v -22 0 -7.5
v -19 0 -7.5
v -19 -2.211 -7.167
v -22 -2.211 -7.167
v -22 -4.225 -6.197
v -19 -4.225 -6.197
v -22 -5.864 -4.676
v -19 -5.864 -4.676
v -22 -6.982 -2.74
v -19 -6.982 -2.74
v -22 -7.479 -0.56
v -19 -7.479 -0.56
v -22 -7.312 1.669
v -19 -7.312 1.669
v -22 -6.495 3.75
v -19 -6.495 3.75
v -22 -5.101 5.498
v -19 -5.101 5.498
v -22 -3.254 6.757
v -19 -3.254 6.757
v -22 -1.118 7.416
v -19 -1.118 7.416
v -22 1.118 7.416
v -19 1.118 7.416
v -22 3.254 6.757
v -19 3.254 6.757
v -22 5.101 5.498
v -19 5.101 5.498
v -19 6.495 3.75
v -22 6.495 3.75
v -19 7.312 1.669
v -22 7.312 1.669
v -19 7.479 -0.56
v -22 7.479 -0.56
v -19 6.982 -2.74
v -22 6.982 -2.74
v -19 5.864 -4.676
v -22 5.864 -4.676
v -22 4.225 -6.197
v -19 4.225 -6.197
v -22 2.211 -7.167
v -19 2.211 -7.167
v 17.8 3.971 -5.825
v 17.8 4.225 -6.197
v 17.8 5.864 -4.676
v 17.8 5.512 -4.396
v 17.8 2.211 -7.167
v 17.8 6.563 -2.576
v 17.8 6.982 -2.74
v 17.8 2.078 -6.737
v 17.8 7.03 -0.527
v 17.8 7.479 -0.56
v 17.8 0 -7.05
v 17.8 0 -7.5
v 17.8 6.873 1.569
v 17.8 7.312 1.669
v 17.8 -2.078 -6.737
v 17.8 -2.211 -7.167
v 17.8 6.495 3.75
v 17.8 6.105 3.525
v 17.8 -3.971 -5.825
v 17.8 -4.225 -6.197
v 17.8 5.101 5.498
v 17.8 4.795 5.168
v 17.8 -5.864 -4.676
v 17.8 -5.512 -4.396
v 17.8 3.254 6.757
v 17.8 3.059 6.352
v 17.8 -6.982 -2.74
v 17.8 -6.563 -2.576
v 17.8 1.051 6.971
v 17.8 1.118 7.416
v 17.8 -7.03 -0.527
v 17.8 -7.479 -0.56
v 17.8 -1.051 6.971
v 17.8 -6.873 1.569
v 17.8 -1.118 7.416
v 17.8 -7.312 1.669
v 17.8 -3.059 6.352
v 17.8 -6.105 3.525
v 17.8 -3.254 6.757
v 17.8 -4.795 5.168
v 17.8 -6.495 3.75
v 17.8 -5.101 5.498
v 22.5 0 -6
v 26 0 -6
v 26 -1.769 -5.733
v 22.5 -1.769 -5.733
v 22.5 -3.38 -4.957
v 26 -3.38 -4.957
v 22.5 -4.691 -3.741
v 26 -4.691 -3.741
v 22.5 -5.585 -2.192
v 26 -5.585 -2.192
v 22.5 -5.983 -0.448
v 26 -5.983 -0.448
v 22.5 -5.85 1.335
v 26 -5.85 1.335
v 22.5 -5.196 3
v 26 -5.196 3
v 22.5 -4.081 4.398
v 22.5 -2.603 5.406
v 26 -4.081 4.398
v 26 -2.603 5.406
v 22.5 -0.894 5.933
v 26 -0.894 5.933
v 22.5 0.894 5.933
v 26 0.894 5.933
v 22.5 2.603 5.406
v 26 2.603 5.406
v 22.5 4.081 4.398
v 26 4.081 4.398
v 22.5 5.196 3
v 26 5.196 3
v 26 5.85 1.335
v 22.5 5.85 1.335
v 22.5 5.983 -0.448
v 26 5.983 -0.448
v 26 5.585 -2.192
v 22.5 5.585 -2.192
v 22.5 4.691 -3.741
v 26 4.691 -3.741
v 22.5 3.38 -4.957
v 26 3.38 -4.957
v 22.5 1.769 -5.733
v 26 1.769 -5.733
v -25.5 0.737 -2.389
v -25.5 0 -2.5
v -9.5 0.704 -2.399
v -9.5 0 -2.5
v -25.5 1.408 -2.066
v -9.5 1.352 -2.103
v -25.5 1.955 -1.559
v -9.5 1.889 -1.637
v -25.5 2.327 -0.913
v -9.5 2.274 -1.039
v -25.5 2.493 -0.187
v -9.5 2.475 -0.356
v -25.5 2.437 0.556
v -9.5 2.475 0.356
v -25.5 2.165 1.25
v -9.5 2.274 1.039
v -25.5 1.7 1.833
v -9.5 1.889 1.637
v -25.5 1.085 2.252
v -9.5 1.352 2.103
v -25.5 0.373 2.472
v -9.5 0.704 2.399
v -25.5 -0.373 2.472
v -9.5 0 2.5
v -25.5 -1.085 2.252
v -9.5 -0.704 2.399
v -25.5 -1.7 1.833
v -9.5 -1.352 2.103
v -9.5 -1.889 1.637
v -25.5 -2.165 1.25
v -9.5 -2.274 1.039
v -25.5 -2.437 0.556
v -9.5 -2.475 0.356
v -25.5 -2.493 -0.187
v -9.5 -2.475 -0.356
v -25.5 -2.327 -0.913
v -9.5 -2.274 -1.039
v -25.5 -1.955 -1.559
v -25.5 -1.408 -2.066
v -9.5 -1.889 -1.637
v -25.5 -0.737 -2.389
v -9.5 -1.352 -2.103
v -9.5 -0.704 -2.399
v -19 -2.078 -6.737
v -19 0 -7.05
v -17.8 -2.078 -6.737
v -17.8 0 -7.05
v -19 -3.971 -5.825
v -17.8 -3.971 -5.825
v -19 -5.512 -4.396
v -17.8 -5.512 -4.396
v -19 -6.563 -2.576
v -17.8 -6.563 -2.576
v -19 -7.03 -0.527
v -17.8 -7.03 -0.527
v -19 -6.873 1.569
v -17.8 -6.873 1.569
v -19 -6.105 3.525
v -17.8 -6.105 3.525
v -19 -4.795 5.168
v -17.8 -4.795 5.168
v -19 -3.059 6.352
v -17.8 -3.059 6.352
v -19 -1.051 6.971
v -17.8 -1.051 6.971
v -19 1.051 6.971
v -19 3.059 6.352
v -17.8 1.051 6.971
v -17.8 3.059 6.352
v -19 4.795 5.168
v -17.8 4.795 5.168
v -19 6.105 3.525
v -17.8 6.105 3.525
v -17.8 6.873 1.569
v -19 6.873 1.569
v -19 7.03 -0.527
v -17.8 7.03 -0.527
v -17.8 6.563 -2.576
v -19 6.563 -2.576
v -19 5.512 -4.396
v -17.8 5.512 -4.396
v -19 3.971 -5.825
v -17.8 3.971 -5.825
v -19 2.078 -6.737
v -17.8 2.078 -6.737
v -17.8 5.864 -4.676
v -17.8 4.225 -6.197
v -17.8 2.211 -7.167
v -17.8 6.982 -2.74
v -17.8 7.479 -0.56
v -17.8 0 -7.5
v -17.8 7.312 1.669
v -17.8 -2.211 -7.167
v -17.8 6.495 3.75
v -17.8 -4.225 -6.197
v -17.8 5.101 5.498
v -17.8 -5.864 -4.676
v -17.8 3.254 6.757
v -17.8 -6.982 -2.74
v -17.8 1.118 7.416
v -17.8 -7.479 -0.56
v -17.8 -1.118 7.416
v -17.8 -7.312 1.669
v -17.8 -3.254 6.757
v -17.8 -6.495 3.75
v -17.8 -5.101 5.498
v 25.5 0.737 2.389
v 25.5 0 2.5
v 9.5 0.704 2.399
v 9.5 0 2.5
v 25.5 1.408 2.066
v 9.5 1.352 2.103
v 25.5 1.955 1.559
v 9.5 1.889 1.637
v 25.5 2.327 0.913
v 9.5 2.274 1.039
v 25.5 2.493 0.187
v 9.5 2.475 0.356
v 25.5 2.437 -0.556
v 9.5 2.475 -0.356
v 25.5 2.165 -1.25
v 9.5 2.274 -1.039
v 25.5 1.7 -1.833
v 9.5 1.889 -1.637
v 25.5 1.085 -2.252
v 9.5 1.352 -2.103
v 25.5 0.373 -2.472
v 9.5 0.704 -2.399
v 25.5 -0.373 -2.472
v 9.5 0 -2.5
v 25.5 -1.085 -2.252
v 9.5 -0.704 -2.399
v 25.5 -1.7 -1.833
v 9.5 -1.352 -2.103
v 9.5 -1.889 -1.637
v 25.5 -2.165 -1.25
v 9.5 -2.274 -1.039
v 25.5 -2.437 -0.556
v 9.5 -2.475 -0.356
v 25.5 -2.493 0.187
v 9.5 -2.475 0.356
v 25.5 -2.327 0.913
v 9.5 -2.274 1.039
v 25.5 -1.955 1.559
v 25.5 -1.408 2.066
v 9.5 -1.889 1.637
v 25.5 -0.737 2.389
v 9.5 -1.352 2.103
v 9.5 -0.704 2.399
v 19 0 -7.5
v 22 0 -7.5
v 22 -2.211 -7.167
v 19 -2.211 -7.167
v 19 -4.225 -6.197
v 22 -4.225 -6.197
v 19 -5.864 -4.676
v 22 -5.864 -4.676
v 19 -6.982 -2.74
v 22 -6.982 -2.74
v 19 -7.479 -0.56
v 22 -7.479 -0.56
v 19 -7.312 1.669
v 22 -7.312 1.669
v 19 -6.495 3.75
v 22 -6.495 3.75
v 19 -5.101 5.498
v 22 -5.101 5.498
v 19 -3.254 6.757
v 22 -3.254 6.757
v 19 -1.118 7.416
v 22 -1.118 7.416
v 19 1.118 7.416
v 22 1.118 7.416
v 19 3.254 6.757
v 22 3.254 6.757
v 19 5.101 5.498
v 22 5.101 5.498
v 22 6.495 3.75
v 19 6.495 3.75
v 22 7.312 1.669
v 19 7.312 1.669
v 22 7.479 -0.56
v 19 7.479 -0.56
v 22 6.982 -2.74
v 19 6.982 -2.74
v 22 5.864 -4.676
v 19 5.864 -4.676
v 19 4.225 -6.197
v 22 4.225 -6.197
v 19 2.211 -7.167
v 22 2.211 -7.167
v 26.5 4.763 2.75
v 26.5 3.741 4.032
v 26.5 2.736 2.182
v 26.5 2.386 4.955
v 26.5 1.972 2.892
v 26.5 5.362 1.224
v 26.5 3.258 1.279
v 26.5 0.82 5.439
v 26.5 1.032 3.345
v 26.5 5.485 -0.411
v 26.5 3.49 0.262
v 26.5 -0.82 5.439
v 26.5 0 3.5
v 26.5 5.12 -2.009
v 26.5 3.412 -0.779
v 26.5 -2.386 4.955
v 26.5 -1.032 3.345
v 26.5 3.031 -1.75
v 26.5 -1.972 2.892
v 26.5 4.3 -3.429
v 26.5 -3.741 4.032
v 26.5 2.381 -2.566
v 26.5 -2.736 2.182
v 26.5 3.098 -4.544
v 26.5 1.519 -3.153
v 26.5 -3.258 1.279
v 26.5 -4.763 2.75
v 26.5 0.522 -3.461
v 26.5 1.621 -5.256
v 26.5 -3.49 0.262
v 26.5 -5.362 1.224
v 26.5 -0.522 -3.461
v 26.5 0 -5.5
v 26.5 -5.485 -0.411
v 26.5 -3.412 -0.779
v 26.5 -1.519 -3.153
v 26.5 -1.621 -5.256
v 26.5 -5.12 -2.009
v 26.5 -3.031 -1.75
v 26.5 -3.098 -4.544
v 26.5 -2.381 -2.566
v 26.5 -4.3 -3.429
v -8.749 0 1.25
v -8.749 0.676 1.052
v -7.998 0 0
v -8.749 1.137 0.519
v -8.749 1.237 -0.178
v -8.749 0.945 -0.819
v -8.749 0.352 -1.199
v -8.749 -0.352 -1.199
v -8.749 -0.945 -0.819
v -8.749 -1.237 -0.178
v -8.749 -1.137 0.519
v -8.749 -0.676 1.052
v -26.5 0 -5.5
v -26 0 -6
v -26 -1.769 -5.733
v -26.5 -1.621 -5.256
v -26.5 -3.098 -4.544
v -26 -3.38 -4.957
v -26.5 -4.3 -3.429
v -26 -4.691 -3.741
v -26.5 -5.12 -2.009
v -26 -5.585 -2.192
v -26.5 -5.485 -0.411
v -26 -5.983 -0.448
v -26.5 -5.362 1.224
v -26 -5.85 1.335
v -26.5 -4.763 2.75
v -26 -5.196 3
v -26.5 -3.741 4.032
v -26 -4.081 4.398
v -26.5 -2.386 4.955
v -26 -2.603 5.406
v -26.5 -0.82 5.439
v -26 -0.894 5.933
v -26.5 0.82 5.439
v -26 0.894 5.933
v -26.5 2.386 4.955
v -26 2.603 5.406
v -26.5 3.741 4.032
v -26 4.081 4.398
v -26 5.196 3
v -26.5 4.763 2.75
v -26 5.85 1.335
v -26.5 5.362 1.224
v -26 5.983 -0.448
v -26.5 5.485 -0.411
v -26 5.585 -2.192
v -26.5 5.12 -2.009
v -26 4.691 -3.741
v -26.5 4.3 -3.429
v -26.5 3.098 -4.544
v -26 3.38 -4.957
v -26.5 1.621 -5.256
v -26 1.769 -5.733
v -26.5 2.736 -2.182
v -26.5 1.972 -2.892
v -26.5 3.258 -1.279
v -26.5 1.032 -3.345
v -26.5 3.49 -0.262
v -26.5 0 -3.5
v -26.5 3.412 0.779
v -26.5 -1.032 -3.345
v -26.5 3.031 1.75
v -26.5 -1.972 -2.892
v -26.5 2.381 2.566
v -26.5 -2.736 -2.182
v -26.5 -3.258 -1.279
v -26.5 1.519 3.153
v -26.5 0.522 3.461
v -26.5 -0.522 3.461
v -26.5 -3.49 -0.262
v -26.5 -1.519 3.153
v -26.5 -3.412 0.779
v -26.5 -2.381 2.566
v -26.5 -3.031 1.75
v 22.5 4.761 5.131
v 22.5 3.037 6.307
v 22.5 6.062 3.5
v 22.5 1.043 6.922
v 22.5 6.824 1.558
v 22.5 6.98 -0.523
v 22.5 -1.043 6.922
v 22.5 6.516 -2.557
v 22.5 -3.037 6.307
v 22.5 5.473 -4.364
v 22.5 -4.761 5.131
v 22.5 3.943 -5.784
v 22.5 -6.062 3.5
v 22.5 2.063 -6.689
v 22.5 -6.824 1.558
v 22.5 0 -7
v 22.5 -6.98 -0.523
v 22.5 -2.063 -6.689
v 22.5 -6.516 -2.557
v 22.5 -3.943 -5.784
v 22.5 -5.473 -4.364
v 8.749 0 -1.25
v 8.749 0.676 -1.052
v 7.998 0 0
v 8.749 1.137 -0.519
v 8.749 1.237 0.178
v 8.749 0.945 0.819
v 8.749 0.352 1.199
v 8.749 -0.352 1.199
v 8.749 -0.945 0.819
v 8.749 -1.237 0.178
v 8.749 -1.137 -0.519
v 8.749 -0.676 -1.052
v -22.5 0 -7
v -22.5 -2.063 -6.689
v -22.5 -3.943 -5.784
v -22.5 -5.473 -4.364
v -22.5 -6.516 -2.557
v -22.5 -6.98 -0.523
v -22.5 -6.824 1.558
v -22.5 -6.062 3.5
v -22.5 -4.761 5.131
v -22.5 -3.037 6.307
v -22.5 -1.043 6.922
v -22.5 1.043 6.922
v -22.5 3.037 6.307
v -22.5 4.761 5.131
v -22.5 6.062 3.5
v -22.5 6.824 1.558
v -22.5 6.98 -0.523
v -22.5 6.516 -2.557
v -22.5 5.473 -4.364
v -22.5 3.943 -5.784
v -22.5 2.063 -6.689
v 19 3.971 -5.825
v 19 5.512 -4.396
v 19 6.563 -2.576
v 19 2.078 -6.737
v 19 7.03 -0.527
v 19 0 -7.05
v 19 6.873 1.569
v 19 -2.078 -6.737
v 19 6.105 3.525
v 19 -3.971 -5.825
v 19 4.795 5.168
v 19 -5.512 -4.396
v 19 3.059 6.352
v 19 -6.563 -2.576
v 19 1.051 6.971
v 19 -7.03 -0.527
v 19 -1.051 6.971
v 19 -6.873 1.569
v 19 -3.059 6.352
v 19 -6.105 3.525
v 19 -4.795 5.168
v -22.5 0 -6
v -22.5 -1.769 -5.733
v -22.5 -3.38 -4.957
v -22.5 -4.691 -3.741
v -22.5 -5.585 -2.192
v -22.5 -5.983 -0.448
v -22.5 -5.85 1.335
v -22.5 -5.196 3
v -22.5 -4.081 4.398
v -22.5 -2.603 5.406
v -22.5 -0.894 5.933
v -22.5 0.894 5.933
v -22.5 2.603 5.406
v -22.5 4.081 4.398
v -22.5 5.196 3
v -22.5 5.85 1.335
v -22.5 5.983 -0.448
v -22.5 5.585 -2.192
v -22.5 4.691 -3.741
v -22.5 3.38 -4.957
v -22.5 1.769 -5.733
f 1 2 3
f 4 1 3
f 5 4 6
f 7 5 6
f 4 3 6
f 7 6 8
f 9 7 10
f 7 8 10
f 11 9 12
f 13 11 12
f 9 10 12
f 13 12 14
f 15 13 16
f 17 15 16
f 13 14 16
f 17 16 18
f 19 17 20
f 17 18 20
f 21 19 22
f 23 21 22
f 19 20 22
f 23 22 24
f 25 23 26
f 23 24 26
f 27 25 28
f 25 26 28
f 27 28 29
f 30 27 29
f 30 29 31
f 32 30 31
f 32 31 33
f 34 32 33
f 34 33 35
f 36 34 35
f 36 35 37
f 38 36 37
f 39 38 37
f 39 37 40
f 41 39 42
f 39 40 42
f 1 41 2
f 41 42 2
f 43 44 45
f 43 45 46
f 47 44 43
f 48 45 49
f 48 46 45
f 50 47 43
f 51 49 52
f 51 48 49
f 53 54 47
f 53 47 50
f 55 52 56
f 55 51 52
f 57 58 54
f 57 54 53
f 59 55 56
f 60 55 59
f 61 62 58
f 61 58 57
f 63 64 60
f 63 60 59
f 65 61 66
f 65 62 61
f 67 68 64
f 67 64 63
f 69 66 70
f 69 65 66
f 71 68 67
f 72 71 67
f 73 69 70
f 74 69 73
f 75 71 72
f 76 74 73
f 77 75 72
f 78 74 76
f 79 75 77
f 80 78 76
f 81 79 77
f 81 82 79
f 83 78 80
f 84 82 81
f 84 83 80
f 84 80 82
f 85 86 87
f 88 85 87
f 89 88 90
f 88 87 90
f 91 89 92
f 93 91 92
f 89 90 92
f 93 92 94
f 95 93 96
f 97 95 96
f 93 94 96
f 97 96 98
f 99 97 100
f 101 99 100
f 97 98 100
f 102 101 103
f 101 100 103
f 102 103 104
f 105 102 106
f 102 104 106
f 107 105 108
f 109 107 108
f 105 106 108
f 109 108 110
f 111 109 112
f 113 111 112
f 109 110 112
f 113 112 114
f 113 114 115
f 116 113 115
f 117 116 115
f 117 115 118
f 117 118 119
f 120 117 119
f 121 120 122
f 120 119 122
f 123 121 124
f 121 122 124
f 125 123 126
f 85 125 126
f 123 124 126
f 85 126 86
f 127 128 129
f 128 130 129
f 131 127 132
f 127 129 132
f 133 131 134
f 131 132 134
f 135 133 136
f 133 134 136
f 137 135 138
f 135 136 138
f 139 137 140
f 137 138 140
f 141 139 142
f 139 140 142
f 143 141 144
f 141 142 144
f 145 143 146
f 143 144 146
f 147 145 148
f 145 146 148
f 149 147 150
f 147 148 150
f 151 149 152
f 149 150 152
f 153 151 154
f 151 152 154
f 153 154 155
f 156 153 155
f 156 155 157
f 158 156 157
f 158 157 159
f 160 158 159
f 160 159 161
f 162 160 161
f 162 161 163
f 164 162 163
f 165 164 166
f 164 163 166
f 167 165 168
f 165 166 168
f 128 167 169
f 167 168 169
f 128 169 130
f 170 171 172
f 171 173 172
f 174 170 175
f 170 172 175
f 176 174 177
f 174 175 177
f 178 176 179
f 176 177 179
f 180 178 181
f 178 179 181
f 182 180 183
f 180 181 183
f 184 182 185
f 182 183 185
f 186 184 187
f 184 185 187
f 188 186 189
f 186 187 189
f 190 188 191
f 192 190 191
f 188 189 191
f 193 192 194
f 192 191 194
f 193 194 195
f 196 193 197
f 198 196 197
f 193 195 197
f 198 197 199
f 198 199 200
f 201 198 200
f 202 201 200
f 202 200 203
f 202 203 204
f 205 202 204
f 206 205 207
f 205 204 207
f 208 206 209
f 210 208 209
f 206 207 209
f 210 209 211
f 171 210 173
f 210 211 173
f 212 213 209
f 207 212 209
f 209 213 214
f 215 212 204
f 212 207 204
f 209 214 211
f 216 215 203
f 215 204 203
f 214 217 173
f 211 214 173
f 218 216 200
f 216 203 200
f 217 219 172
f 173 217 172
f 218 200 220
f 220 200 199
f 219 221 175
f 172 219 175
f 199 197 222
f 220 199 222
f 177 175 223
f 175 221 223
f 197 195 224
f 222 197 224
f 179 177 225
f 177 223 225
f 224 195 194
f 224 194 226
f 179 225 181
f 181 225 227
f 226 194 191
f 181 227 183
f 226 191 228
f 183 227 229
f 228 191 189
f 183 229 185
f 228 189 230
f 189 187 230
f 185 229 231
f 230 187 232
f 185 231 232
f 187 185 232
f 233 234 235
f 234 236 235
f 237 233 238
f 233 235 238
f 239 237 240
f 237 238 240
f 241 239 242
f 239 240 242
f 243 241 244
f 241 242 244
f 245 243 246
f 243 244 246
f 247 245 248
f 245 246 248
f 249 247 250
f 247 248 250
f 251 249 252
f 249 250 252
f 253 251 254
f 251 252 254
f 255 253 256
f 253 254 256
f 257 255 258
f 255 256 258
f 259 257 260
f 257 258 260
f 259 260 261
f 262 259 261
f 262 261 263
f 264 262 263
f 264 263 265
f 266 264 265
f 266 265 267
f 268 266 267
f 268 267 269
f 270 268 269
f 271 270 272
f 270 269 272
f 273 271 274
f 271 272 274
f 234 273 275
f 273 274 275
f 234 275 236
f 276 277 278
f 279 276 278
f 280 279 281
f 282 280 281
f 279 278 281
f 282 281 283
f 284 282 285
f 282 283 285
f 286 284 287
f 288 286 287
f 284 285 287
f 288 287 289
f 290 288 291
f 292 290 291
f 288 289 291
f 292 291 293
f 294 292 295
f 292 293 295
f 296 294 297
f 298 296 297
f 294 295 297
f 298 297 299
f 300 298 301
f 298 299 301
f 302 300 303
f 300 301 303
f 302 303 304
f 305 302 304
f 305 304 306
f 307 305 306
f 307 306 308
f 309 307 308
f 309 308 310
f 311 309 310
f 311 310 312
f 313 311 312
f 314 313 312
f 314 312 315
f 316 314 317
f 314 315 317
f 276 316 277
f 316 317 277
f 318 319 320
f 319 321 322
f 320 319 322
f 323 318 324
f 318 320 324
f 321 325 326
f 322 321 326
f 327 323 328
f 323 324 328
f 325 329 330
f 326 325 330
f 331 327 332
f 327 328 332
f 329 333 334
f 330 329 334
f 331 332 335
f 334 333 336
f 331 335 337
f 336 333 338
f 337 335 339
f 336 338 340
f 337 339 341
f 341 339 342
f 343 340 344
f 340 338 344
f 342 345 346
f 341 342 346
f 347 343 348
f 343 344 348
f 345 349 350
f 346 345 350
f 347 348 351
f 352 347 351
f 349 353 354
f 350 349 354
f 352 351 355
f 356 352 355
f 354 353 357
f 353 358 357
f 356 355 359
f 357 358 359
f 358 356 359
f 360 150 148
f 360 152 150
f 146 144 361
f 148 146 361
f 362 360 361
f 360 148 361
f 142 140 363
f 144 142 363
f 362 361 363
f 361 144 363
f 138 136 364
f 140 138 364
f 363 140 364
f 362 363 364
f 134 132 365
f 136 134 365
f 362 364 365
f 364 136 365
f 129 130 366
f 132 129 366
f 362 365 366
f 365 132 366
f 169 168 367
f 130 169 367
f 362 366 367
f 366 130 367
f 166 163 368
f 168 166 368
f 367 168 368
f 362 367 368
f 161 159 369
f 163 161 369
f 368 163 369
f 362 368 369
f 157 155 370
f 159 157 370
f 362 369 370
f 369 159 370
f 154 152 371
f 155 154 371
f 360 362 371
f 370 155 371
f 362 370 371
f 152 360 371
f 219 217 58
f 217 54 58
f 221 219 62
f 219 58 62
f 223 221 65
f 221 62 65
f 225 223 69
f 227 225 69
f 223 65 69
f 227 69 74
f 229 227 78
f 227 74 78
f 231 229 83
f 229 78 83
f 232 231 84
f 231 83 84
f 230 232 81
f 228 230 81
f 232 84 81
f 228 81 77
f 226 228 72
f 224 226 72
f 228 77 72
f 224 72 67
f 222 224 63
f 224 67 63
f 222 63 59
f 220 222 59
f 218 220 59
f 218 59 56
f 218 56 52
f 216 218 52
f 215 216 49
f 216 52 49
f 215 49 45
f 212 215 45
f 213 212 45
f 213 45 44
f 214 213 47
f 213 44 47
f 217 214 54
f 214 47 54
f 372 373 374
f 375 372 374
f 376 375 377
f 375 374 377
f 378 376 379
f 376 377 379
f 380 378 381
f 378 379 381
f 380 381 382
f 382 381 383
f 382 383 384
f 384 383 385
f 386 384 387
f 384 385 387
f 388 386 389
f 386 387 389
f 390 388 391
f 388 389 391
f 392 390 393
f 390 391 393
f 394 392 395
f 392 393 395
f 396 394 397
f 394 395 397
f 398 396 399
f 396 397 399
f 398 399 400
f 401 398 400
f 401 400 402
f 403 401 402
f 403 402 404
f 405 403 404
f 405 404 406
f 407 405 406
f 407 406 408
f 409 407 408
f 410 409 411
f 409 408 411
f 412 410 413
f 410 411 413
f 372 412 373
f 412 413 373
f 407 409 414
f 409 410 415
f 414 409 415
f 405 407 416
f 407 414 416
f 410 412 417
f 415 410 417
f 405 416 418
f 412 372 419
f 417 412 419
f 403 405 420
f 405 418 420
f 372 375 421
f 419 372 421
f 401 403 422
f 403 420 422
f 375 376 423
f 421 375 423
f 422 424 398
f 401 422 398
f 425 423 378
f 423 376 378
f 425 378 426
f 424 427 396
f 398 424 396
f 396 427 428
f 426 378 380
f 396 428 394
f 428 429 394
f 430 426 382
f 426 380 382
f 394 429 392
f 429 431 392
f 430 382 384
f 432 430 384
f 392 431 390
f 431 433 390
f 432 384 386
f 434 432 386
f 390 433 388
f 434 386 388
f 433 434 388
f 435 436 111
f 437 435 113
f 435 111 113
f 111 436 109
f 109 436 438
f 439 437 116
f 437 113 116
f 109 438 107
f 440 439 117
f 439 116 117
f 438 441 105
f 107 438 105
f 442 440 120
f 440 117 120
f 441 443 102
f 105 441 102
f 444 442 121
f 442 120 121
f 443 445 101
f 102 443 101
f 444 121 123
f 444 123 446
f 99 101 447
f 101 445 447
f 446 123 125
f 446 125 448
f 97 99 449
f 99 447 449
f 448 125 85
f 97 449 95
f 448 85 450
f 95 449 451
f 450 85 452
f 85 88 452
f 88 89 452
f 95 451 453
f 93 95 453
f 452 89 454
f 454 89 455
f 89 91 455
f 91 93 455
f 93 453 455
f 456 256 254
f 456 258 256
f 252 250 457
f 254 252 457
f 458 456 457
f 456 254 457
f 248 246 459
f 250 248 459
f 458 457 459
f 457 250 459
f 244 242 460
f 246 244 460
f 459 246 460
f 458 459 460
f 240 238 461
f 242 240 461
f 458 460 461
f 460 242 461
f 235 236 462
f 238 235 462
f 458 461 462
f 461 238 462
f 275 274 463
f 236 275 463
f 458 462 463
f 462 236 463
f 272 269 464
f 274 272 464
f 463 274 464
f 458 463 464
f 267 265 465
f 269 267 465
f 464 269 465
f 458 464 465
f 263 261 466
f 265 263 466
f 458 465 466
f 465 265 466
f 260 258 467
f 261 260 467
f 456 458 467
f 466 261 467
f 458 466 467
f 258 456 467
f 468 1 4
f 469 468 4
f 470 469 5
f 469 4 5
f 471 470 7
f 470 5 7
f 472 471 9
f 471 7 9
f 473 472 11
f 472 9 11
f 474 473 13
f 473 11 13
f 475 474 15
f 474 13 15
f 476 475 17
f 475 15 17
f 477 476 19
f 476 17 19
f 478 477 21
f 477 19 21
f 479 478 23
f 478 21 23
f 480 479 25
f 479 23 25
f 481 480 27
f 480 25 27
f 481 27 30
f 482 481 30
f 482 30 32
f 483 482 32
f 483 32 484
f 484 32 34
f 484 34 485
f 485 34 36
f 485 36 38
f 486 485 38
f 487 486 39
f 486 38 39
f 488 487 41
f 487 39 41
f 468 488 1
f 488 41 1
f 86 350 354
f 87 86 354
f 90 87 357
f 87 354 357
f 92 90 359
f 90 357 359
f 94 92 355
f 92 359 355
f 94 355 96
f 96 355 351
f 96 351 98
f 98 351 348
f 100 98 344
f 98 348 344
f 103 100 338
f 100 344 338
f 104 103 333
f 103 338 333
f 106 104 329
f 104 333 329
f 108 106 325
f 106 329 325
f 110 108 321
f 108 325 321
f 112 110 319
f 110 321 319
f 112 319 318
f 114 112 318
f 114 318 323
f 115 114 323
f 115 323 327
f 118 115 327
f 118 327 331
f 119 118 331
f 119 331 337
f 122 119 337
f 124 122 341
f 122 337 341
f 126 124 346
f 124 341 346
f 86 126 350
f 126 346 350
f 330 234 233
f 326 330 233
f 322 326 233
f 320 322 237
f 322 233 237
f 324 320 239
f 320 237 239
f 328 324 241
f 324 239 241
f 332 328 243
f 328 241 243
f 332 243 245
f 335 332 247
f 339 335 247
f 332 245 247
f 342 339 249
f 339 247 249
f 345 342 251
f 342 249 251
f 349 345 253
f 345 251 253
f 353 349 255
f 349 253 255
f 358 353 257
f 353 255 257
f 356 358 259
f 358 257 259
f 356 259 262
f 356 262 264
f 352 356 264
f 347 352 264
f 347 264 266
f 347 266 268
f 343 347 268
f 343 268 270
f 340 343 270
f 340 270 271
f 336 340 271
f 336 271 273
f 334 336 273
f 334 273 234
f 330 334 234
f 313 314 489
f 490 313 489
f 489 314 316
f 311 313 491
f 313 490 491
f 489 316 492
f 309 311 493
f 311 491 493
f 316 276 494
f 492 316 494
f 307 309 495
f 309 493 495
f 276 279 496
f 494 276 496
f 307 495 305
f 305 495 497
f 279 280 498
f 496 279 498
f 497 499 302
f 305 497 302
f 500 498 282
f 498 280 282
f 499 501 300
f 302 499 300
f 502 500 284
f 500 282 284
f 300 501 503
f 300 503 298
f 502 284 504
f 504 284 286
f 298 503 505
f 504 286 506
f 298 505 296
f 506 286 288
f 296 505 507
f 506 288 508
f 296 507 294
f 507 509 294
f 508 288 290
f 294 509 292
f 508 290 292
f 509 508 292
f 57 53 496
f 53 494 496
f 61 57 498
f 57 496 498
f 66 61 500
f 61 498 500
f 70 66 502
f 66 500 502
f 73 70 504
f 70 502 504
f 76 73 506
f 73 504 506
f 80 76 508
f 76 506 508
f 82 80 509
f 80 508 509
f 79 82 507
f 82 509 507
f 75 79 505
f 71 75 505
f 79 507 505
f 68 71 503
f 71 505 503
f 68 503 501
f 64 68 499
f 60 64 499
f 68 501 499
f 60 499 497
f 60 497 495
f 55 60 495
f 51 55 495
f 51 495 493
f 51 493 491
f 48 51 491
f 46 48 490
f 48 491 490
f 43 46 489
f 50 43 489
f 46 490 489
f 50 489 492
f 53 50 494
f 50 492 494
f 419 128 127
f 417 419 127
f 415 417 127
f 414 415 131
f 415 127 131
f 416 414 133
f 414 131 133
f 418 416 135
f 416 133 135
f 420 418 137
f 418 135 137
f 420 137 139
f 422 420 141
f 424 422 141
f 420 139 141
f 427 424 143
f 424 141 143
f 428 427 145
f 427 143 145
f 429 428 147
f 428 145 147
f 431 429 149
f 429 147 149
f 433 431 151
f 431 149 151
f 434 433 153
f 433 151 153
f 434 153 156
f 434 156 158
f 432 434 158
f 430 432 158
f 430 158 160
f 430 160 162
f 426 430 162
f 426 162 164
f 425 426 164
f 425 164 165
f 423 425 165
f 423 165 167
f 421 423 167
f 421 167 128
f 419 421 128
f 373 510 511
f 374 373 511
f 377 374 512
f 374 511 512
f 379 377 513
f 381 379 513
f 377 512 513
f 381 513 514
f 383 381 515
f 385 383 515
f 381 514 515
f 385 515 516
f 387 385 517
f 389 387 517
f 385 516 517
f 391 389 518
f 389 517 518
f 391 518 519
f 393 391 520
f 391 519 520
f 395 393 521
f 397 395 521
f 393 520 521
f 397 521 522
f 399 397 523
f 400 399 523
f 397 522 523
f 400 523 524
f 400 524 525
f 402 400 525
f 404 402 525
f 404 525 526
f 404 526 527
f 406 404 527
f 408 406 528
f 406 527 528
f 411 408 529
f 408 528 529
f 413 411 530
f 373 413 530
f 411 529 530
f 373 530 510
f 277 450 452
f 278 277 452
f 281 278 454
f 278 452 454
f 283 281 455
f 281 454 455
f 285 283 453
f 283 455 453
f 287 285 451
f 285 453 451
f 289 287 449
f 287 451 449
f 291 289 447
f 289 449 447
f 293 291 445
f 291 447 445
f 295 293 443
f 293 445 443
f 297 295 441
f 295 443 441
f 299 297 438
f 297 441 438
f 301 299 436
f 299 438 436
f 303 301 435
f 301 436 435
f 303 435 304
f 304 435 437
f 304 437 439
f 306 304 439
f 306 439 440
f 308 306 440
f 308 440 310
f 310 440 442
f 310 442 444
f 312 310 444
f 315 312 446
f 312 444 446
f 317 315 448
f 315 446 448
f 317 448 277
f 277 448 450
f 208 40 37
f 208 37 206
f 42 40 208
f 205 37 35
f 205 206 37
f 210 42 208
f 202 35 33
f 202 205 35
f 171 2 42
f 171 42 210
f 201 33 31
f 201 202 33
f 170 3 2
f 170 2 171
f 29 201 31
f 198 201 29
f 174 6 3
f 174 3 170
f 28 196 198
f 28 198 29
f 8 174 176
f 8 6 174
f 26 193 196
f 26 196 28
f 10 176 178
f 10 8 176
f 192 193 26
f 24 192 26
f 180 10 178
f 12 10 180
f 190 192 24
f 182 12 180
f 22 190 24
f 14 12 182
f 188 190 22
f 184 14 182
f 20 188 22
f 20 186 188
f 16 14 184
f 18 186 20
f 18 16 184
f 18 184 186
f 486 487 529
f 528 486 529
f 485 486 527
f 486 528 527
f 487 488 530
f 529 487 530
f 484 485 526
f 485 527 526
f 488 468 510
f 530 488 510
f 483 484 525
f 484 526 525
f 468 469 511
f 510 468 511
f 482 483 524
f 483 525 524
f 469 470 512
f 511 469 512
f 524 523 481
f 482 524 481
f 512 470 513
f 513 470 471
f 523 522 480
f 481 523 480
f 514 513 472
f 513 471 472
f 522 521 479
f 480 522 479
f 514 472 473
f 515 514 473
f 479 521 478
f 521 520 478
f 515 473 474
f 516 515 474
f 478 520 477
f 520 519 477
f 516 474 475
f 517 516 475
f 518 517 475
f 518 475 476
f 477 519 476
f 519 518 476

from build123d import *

# Parameters (mm, degrees)
HOLE_WIZARD_M61_D           = 5
HOLE_WIZARD_M61_DEPTH       = 17
HOLE_WIZARD_M61_CSINK_D     = 7
HOLE_WIZARD_M61_CSINK_ANGLE = 90
HOLE_WIZARD_M61_TIP         = 1.502151548
HOLE_WIZARD_M62_D           = 5
HOLE_WIZARD_M62_DEPTH       = 17
HOLE_WIZARD_M62_CSINK_D     = 7
HOLE_WIZARD_M62_CSINK_ANGLE = 90
HOLE_WIZARD_M62_TIP         = 1.502151548
SKETCH_5_W                  = 1.2
SKETCH_5_H                  = 0.45
CHAMFER_2_SIZE              = 0.5


with BuildPart() as part:
    # Эскиз1 → Повернуть1 (revolve)
    with BuildSketch(Plane.XY, mode=Mode.PRIVATE) as revolve_1_sk:
        Polygon((-26.5, 0), (-26.5, 6), (-22.5, 6), (-22.5, 7.5), (22.5, 7.5), (22.5, 6), (26.5, 6), (26.5, 0), align=None)
    revolve(revolve_1_sk.sketch.rotate(Axis((0, 0, 0), (-1, 0, 0)), 90), axis=Axis((0, 0, 0), (-1, 0, 0)))

    # Отверстие обработанное метчиком M61
    with Locations(Plane.ZY.offset(26.5)):
        with Locations((0, 0)):
            CounterSinkHole(HOLE_WIZARD_M61_D / 2, HOLE_WIZARD_M61_CSINK_D / 2, depth=HOLE_WIZARD_M61_DEPTH, counter_sink_angle=HOLE_WIZARD_M61_CSINK_ANGLE)
            with Locations((0, 0, -(HOLE_WIZARD_M61_DEPTH + HOLE_WIZARD_M61_TIP / 2))):  # 118° drill point
                Cone(0, HOLE_WIZARD_M61_D / 2, HOLE_WIZARD_M61_TIP, mode=Mode.SUBTRACT)

    # Отверстие обработанное метчиком M62
    with Locations(Plane(origin=(26.5, 0, 0), x_dir=(0, 0, -1), z_dir=(1, 0, 0))):
        with Locations((0, 0)):
            CounterSinkHole(HOLE_WIZARD_M62_D / 2, HOLE_WIZARD_M62_CSINK_D / 2, depth=HOLE_WIZARD_M62_DEPTH, counter_sink_angle=HOLE_WIZARD_M62_CSINK_ANGLE)
            with Locations((0, 0, -(HOLE_WIZARD_M62_DEPTH + HOLE_WIZARD_M62_TIP / 2))):  # 118° drill point
                Cone(0, HOLE_WIZARD_M62_D / 2, HOLE_WIZARD_M62_TIP, mode=Mode.SUBTRACT)

    # Эскиз5 → Вырез-Повернуть1 (revolve, cut)
    with BuildSketch(Plane.XY, mode=Mode.PRIVATE) as cut_revolve_1_sk:
        with Locations((-18.4, 7.275)):
            Rectangle(SKETCH_5_W, SKETCH_5_H)
        with Locations((18.4, 7.275)):
            Rectangle(SKETCH_5_W, SKETCH_5_H)
    revolve(cut_revolve_1_sk.sketch.rotate(Axis((0, 0, 0), (-1, 0, 0)), 90), axis=Axis((0, 0, 0), (-1, 0, 0)), mode=Mode.SUBTRACT)

    # Фаска2
    chamfer_2_edges = [part.edges().sort_by_distance(p)[0] for p in [
        (26.5, 0, 6),
        (22.5, 0, 7.5),
        (-22.5, 0, 7.5),
        (-26.5, 0, 6),
    ]]
    chamfer(chamfer_2_edges, length=CHAMFER_2_SIZE)


solid = part.part
